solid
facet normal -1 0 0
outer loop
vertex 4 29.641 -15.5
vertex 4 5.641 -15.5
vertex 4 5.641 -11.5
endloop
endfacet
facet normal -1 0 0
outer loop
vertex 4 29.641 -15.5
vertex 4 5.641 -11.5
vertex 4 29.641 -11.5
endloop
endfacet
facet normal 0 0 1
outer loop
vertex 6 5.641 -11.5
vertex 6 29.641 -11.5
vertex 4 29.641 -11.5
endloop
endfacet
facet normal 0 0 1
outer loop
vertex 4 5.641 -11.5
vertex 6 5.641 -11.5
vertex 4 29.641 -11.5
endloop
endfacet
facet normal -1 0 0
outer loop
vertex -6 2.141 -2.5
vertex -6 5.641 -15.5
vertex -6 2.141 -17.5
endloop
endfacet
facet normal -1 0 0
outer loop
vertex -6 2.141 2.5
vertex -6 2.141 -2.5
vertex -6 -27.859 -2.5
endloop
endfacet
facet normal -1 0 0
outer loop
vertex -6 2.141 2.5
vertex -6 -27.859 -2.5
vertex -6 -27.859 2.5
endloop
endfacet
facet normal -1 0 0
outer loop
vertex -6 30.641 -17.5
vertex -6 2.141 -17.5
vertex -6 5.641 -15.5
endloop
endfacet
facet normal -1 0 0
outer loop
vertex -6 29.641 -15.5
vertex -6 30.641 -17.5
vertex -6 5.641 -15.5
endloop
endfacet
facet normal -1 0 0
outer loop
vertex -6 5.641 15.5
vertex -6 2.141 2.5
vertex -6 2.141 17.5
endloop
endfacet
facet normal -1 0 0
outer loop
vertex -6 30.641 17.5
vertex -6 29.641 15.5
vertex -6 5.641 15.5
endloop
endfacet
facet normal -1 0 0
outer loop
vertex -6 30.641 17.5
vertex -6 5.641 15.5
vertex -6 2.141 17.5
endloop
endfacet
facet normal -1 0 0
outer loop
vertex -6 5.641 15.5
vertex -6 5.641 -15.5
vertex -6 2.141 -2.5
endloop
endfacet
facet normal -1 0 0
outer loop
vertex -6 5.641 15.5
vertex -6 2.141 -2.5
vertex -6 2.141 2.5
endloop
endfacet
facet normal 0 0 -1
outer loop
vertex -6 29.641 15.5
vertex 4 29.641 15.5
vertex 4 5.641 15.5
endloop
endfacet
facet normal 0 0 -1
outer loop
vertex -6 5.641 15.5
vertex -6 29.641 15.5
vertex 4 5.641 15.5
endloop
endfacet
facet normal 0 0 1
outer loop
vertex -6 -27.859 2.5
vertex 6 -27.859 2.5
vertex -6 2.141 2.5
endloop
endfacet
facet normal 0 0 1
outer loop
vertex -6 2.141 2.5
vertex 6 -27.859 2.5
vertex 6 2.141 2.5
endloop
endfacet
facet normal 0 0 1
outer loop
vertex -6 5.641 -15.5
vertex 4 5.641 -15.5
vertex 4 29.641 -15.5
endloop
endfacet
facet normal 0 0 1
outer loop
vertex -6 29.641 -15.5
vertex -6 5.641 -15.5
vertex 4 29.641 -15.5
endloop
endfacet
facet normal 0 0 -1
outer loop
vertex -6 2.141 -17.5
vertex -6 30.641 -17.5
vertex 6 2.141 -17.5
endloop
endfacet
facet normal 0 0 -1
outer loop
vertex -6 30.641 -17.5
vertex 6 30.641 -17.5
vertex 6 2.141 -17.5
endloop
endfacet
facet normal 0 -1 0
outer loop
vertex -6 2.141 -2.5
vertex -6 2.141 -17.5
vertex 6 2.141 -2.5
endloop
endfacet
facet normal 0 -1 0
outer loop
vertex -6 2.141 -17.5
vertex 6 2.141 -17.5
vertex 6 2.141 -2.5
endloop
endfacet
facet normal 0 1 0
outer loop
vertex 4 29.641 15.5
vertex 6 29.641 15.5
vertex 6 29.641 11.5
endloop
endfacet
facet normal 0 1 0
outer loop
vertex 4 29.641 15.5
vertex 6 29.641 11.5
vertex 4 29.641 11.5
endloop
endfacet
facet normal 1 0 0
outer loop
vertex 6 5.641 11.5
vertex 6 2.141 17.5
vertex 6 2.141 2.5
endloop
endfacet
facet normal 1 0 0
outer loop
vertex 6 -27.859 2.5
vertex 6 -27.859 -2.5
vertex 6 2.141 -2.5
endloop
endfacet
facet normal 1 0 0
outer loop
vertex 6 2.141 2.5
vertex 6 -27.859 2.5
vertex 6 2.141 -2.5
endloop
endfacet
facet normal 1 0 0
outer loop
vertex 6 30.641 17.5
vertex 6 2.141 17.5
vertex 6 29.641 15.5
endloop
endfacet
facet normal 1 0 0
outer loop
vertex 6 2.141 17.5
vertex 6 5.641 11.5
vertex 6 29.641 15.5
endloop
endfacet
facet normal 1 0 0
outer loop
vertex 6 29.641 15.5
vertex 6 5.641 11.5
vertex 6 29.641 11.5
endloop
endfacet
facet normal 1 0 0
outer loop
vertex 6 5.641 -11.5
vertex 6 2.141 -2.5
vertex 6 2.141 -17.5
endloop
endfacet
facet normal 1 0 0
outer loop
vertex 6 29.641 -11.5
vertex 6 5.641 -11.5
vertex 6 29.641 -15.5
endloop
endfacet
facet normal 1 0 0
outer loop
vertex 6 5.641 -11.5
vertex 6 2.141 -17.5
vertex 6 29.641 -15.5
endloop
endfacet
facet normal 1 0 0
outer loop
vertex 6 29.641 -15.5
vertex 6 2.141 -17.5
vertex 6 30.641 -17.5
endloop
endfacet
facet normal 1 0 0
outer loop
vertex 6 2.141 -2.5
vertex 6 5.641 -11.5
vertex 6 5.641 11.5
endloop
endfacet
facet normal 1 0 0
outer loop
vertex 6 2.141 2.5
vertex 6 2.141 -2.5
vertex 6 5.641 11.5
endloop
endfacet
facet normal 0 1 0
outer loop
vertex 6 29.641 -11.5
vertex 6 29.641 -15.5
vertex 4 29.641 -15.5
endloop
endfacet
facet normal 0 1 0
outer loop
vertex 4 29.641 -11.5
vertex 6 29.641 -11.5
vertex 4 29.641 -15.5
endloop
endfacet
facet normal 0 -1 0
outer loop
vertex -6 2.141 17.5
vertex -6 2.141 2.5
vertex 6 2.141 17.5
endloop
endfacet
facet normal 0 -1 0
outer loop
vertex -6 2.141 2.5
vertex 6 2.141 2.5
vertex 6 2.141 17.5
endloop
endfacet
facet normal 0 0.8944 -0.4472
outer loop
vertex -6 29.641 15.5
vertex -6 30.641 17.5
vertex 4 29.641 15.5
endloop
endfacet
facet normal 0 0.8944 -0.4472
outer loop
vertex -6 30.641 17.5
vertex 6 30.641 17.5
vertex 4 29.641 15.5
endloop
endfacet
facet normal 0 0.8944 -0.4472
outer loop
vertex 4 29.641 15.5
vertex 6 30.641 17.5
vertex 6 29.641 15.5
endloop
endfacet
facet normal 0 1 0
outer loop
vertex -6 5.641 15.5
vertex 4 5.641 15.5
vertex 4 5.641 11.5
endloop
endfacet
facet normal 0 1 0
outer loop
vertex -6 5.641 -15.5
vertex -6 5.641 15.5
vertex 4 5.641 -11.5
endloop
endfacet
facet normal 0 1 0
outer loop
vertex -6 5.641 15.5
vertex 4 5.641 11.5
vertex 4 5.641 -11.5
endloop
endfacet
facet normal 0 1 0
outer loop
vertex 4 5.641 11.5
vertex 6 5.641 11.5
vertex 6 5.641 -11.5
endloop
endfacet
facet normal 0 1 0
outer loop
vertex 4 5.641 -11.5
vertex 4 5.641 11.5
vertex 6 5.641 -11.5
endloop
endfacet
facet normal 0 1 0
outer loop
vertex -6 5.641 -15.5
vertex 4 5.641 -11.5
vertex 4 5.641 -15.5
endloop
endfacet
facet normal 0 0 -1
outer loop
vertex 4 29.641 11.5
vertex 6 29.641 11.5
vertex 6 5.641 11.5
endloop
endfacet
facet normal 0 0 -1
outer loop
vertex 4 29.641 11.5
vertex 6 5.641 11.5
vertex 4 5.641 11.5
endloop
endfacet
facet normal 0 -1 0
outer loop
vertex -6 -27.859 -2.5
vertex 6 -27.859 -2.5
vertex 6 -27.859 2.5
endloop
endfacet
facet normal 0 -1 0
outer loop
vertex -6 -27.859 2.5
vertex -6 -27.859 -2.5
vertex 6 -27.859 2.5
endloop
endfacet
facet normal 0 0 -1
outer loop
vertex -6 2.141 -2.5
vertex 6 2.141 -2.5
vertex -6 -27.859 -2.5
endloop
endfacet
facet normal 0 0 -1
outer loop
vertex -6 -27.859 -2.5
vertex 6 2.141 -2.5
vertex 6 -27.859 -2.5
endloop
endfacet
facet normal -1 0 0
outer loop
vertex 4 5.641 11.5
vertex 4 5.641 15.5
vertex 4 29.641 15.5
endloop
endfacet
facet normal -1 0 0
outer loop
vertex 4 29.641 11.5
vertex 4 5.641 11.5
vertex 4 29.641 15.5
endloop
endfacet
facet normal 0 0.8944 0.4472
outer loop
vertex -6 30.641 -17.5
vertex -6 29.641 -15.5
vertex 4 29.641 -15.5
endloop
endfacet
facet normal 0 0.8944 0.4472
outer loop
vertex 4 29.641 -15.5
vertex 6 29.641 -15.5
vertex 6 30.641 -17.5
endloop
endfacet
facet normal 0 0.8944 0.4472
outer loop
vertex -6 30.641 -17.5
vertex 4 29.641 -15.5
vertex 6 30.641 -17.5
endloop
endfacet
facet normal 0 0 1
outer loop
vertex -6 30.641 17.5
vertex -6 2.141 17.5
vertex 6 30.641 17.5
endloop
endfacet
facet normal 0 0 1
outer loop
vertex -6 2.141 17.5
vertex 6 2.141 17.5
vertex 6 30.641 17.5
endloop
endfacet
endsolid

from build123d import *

# Parameters (mm, degrees)
BOSS_EXTRUDE1_DEPTH = 6
SKETCH2_W           = 2
SKETCH2_H           = 24
BOSS_EXTRUDE2_DEPTH = 4


with BuildPart() as part:
    # Sketch1 → Boss-Extrude1 (new, symmetric)
    with BuildSketch(Plane(origin=(0, 0, 0), x_dir=(0, 0, -1), z_dir=(1, 0, 0))):
        Polygon((-2.5, -27.858843537), (-2.5, 2.141156463), (-17.5, 2.141156463), (-17.5, 30.641156463), (-15.5, 29.641156463), (-15.5, 5.641156463), (15.5, 5.641156463), (15.5, 29.641156463), (17.5, 30.641156463), (17.5, 2.141156463), (2.5, 2.141156463), (2.5, -27.858843537), align=None)
    extrude(amount=BOSS_EXTRUDE1_DEPTH, both=True)

    # Sketch2 → Boss-Extrude2 (add)
    with BuildSketch(Plane(origin=(0, 0, 15.5), x_dir=(-1, 0, 0), z_dir=(0, 0, -1))):
        with Locations((-5, 17.641156463)):
            Rectangle(SKETCH2_W, SKETCH2_H)
    boss_extrude2 = extrude(amount=BOSS_EXTRUDE2_DEPTH)

    # Mirror1: Boss-Extrude2 across plane
    add(boss_extrude2.mirror(Plane(origin=(0, 0, 0), x_dir=(1, 0, 0), z_dir=(0, 0, -1))))


solid = part.part
